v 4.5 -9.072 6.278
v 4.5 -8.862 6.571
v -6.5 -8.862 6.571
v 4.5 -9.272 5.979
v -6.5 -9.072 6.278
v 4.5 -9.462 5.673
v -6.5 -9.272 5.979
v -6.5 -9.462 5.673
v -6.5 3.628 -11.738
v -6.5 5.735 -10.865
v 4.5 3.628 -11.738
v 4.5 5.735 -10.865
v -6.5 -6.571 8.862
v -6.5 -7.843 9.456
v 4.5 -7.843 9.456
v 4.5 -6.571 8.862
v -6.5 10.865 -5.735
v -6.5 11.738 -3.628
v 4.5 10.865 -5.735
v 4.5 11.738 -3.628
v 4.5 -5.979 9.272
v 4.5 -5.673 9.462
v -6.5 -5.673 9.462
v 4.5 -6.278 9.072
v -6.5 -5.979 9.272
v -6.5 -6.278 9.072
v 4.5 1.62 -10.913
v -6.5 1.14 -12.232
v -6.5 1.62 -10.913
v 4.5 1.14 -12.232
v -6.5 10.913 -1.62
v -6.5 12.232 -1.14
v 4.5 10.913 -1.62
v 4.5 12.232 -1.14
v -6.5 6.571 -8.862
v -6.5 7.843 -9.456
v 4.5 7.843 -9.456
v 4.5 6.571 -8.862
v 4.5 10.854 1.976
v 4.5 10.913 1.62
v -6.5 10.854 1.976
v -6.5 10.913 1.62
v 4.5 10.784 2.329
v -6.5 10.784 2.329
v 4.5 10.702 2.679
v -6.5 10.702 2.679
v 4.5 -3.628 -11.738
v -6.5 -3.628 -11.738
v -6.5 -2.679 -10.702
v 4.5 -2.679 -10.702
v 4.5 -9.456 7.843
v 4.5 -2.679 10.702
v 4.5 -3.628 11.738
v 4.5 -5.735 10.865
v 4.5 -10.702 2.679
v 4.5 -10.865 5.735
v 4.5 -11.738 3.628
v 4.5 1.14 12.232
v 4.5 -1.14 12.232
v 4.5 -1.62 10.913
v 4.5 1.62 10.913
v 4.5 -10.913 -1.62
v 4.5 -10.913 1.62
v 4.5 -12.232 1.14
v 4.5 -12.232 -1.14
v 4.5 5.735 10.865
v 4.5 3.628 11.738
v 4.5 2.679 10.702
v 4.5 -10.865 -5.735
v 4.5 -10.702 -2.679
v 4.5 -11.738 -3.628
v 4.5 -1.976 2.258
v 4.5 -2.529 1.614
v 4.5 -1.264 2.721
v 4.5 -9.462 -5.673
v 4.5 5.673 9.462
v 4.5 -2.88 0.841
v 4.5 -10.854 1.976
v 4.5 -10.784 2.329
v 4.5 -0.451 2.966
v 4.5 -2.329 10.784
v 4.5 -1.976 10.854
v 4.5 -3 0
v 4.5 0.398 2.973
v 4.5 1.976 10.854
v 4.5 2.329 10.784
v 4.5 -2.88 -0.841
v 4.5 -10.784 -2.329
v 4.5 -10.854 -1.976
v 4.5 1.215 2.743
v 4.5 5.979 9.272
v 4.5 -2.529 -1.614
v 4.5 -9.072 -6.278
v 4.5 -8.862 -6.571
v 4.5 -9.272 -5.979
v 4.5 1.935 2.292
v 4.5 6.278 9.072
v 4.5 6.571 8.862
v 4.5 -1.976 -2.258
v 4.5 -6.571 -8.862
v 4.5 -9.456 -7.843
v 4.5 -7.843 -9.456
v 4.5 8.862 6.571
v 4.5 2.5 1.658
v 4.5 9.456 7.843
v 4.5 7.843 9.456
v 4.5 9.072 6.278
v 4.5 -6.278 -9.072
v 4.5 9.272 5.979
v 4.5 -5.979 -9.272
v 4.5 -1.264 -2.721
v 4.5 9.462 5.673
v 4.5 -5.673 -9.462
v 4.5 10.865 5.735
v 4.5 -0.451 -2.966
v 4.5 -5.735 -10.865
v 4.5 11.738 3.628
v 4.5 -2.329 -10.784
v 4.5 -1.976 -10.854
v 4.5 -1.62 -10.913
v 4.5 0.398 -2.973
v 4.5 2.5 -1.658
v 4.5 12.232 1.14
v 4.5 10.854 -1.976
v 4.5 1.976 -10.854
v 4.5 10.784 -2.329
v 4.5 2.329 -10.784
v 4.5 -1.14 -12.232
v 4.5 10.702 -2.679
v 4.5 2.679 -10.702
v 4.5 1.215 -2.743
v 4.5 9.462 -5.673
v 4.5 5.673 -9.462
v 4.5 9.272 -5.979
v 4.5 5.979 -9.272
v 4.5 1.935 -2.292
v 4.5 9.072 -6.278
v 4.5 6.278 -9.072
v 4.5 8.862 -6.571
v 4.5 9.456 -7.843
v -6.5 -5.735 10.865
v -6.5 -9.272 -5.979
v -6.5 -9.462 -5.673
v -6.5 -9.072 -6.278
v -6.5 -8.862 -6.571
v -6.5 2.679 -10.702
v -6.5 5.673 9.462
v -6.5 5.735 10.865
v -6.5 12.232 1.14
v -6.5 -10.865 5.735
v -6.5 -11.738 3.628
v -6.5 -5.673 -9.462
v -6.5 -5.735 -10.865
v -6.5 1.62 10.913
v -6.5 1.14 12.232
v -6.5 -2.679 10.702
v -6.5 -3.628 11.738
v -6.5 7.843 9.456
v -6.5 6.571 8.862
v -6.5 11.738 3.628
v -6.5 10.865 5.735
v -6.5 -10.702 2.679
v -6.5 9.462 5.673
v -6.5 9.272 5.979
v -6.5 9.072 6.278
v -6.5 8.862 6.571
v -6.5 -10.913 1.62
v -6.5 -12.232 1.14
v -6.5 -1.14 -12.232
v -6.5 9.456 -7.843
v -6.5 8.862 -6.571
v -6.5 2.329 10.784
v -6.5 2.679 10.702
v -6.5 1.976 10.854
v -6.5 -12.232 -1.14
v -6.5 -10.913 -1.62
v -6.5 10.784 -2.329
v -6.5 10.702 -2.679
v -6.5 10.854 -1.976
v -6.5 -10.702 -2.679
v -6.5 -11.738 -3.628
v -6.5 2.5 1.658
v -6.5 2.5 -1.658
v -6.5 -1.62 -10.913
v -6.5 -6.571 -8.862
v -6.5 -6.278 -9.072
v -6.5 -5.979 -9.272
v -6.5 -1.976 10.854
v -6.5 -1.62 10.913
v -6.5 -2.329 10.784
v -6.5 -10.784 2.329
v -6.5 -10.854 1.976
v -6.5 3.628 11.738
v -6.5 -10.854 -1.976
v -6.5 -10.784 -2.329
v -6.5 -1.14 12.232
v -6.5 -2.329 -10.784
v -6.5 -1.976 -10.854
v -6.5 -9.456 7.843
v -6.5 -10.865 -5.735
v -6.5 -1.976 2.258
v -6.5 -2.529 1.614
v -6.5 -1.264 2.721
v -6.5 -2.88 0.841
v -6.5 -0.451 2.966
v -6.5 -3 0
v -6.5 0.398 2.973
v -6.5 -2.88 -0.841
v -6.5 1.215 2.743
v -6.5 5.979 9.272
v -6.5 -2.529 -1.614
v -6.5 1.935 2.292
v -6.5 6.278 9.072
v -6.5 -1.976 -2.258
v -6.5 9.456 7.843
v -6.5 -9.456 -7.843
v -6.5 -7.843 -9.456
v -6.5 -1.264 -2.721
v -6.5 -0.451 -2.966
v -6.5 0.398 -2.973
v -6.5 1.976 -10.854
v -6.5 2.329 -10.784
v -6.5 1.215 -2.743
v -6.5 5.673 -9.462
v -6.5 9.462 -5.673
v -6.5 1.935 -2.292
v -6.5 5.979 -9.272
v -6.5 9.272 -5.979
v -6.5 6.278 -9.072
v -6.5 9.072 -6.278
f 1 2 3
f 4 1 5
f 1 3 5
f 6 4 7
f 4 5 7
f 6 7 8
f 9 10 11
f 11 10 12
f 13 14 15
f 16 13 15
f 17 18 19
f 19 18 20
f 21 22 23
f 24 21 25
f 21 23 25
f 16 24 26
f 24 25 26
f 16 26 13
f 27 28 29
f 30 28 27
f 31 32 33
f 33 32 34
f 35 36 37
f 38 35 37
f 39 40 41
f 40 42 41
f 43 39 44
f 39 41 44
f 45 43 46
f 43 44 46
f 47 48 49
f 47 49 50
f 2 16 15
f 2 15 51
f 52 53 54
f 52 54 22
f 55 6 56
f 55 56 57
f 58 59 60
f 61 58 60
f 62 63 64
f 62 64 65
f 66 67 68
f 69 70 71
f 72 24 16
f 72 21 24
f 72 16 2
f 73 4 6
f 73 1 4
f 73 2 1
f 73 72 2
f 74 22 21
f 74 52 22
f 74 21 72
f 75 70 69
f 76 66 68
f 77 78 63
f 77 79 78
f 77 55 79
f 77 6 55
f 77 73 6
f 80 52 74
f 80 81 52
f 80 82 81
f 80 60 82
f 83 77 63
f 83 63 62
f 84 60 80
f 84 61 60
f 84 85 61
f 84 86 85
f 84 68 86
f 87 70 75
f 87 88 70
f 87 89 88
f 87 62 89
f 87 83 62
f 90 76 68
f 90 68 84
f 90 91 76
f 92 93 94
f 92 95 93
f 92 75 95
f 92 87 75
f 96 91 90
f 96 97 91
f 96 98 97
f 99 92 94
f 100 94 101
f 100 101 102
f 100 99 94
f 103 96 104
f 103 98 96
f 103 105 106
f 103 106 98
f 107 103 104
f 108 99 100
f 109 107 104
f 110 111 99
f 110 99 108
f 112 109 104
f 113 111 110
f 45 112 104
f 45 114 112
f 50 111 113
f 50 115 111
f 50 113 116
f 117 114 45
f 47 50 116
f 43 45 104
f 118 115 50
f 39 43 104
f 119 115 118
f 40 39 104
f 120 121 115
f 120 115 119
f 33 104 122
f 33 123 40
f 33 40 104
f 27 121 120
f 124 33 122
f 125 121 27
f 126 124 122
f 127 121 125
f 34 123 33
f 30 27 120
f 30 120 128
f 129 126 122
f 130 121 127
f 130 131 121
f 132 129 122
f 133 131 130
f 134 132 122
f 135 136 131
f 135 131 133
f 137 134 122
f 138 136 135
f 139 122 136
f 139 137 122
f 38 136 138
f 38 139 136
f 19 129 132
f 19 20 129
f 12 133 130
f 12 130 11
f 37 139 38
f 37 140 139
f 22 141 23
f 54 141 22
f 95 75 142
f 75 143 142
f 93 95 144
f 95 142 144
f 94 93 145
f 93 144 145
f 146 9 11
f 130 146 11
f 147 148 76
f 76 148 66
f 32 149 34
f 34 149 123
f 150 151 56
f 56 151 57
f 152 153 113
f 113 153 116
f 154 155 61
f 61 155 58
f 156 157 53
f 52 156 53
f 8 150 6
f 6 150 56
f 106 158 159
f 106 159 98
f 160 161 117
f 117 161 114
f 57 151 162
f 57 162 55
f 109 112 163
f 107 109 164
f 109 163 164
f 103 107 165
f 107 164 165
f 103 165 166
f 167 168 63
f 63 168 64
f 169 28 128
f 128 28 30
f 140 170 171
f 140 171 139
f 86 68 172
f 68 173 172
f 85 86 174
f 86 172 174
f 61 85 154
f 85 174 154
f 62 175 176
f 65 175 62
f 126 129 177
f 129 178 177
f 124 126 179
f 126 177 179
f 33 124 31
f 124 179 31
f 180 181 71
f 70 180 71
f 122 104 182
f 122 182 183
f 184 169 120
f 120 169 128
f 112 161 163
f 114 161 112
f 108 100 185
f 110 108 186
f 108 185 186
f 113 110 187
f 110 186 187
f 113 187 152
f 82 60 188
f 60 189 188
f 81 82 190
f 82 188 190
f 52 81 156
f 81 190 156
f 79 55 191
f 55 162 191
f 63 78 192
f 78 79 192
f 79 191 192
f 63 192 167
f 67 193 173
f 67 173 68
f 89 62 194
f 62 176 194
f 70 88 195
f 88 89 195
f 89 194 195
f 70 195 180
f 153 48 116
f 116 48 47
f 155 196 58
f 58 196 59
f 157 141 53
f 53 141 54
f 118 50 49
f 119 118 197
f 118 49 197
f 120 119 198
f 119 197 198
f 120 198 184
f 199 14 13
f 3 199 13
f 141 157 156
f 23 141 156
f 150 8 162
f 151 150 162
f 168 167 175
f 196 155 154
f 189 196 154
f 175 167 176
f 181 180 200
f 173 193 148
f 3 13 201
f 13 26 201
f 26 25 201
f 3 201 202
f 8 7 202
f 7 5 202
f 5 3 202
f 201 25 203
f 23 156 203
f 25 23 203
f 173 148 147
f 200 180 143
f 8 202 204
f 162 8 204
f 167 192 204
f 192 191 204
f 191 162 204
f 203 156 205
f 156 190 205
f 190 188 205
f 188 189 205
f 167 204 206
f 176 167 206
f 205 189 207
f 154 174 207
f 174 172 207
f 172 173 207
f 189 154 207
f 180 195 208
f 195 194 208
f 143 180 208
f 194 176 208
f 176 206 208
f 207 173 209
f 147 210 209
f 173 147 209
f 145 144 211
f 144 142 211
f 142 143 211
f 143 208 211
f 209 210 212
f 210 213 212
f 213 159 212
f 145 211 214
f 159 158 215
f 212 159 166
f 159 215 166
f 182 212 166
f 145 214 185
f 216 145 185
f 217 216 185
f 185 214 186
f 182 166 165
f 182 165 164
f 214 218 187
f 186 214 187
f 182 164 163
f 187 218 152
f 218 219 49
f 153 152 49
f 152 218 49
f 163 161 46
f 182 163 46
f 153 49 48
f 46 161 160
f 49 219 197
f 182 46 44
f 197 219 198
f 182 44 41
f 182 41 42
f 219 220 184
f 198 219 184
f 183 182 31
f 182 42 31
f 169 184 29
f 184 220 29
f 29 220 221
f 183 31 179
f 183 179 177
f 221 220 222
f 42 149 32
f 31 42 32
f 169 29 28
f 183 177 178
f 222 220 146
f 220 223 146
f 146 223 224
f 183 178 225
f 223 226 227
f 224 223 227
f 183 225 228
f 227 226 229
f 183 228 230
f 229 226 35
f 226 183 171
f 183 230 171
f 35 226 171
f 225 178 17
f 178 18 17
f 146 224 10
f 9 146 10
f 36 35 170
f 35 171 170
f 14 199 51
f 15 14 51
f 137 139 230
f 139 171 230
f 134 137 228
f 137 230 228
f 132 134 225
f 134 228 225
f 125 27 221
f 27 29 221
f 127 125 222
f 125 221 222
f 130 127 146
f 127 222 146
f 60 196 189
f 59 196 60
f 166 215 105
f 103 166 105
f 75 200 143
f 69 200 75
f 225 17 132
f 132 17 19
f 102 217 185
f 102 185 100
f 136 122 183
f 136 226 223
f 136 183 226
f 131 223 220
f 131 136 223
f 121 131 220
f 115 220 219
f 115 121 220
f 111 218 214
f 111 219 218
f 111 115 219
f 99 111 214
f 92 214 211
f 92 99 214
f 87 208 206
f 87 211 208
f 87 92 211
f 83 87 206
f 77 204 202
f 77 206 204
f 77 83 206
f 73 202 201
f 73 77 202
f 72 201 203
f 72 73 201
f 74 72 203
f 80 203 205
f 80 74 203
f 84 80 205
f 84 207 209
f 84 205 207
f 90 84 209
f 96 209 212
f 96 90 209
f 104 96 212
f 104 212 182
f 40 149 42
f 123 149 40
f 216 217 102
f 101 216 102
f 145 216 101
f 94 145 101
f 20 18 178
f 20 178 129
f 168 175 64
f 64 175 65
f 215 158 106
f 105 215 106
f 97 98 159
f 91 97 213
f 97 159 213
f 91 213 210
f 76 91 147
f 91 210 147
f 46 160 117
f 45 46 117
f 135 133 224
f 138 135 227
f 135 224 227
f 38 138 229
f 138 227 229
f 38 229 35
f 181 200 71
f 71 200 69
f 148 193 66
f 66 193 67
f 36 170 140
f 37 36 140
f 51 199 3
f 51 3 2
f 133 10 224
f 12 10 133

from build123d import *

# Parameters (mm, degrees)
RIB1_REACH         = 26.171
SKETCH5_WALL_W     = 63.342527862
SKETCH5_WALL_H     = 2.28033022
RIB1_DRAFT_ANGLE   = 20
RIB2_REACH         = 26.171
SKETCH6_WALL_W     = 63.342527862
SKETCH6_WALL_H     = 2.28033022
RIB2_DRAFT_ANGLE   = 20
RIB3_REACH         = 26.171
SKETCH7_WALL_W     = 63.342527862
SKETCH7_WALL_H     = 2.28033022
RIB3_DRAFT_ANGLE   = 20
RIB4_REACH         = 26.171
SKETCH8_WALL_W     = 63.342527862
SKETCH8_WALL_H     = 2.28033022
RIB4_DRAFT_ANGLE   = 20
RIB5_REACH         = 26.171
SKETCH9_WALL_W     = 63.342527862
SKETCH9_WALL_H     = 2.28033022
RIB5_DRAFT_ANGLE   = 20
RIB6_REACH         = 26.171
SKETCH10_WALL_W    = 63.342527862
SKETCH10_WALL_H    = 2.28033022
RIB6_DRAFT_ANGLE   = 20
RIB7_REACH         = 26.171
SKETCH11_WALL_W    = 63.342527862
SKETCH11_WALL_H    = 2.28033022
RIB7_DRAFT_ANGLE   = 20
RIB8_REACH         = 26.171
SKETCH12_WALL_W    = 63.342527862
SKETCH12_WALL_H    = 2.28033022
RIB8_DRAFT_ANGLE   = 20
RIB9_REACH         = 26.171
SKETCH13_WALL_W    = 63.342527862
SKETCH13_WALL_H    = 2.28033022
RIB9_DRAFT_ANGLE   = 20
RIB10_REACH        = 26.171
SKETCH14_WALL_W    = 63.342527862
SKETCH14_WALL_H    = 2.28033022
RIB10_DRAFT_ANGLE  = 20
RIB11_REACH        = 26.171
SKETCH15_WALL_W    = 63.342527862
SKETCH15_WALL_H    = 2.28033022
RIB11_DRAFT_ANGLE  = 20
RIB12_REACH        = 26.171
SKETCH16_WALL_W    = 63.342527862
SKETCH16_WALL_H    = 2.28033022
RIB12_DRAFT_ANGLE  = 20
RIB13_REACH        = 26.171
SKETCH17_WALL_W    = 63.342527862
SKETCH17_WALL_H    = 2.28033022
RIB13_DRAFT_ANGLE  = 20
RIB14_REACH        = 26.171
SKETCH18_WALL_W    = 63.342527862
SKETCH18_WALL_H    = 2.28033022
RIB14_DRAFT_ANGLE  = 20
RIB15_REACH        = 26.171
SKETCH19_WALL_W    = 63.342527862
SKETCH19_WALL_H    = 2.28033022
RIB15_DRAFT_ANGLE  = 20
RIB16_REACH        = 26.171
SKETCH20_WALL_W    = 63.342527862
SKETCH20_WALL_H    = 2.28033022
RIB16_DRAFT_ANGLE  = 20
SKETCH22_R         = 1.5
CUT_EXTRUDE3_DEPTH = 28.712812921
SKETCH21_R         = 20.000403523
CUT_EXTRUDE1_DEPTH = 28.147743921
CUT_EXTRUDE2_START = 13
SKETCH21_2_R       = 20.000403523
CUT_EXTRUDE2_DEPTH = 15.147743921
CUT_EXTRUDE4_DEPTH = 22.639385313
SKETCH24_R         = 18.96161632
CUT_EXTRUDE5_DEPTH = 2


with BuildPart() as part:
    # Sketch1 → Revolve1 (revolve)
    with BuildSketch(Plane.XY, mode=Mode.PRIVATE) as revolve1_sk:
        Polygon((-7.5, 12.3), (-7.5, 0), (7.5, 0), (7.5, 12.3), (8.5, 15.5), (7.5, 16), (6.5, 12.3), (6.5, 11.032395447), (-6.5, 11.032395447), (-6.5, 12.3), (-7.5, 16), (-8.5, 15.5), align=None)
    revolve(revolve1_sk.sketch.rotate(Axis((-8.5, 0, 0), (1, 0, 0)), 270), axis=Axis((-8.5, 0, 0), (1, 0, 0)))

    # Sketch5 wall → Rib1 (add, up to next)
    with BuildSketch(Plane(origin=(0, -12.232395447, 0), x_dir=(1, 0, 0), z_dir=(0, 1, 0)), mode=Mode.PRIVATE) as rib1_sk1:
        Rectangle(SKETCH5_WALL_W, SKETCH5_WALL_H)
    rib1_tool1 = extrude(rib1_sk1.sketch, amount=RIB1_REACH, mode=Mode.PRIVATE) - part.part
    add(rib1_tool1.solids().sort_by_distance((0, -12.232395447, 0))[0])

    # Rib1 draft
    rib1_draft_faces = [part.faces().sort_by_distance(p)[0] for p in [
        (0, -11.732395447, -1.14016511),
        (0, -11.732395447, 1.14016511),
    ]]
    draft(rib1_draft_faces, Plane.XZ.offset(12.232395447), RIB1_DRAFT_ANGLE)

    # Sketch6 wall → Rib2 (add, up to next)
    with BuildSketch(Plane.XY.offset(-12.232395447), mode=Mode.PRIVATE) as rib2_sk1:
        Rectangle(SKETCH6_WALL_W, SKETCH6_WALL_H)
    rib2_tool1 = extrude(rib2_sk1.sketch, amount=RIB2_REACH, mode=Mode.PRIVATE) - part.part
    add(rib2_tool1.solids().sort_by_distance((0, 0, -12.232395447))[0])

    # Rib2 draft
    rib2_draft_faces = [part.faces().sort_by_distance(p)[0] for p in [
        (0, 1.14016511, -11.732395447),
        (0, -1.14016511, -11.732395447),
    ]]
    draft(rib2_draft_faces, Plane(origin=(0, 0, -12.232395447), x_dir=(1, 0, 0), z_dir=(0, 0, -1)), RIB2_DRAFT_ANGLE)

    # Sketch7 wall → Rib3 (add, up to next)
    with BuildSketch(Plane.XZ.offset(-12.232395447), mode=Mode.PRIVATE) as rib3_sk1:
        Rectangle(SKETCH7_WALL_W, SKETCH7_WALL_H)
    rib3_tool1 = extrude(rib3_sk1.sketch, amount=RIB3_REACH, mode=Mode.PRIVATE) - part.part
    add(rib3_tool1.solids().sort_by_distance((0, 12.232395447, 0))[0])

    # Rib3 draft
    rib3_draft_faces = [part.faces().sort_by_distance(p)[0] for p in [
        (0, 11.732395447, 1.14016511),
        (0, 11.732395447, -1.14016511),
    ]]
    draft(rib3_draft_faces, Plane(origin=(0, 12.232395447, 0), x_dir=(1, 0, 0), z_dir=(0, 1, 0)), RIB3_DRAFT_ANGLE)

    # Sketch8 wall → Rib4 (add, up to next)
    with BuildSketch(Plane(origin=(0, 0, 12.232395447), x_dir=(1, 0, 0), z_dir=(0, 0, -1)), mode=Mode.PRIVATE) as rib4_sk1:
        Rectangle(SKETCH8_WALL_W, SKETCH8_WALL_H)
    rib4_tool1 = extrude(rib4_sk1.sketch, amount=RIB4_REACH, mode=Mode.PRIVATE) - part.part
    add(rib4_tool1.solids().sort_by_distance((0, 0, 12.232395447))[0])

    # Rib4 draft
    rib4_draft_faces = [part.faces().sort_by_distance(p)[0] for p in [
        (0, -1.14016511, 11.732395447),
        (0, 1.14016511, 11.732395447),
    ]]
    draft(rib4_draft_faces, Plane.XY.offset(12.232395447), RIB4_DRAFT_ANGLE)

    # Sketch9 wall → Rib5 (add, up to next)
    with BuildSketch(Plane(origin=(0, 8.649609771, 8.649609771), x_dir=(1, 0, 0), z_dir=(0, -0.707106781187, -0.707106781187)), mode=Mode.PRIVATE) as rib5_sk1:
        Rectangle(SKETCH9_WALL_W, SKETCH9_WALL_H)
    rib5_tool1 = extrude(rib5_sk1.sketch, amount=RIB5_REACH, mode=Mode.PRIVATE) - part.part
    add(rib5_tool1.solids().sort_by_distance((0, 8.649609771, 8.649609771))[0])

    # Rib5 draft
    rib5_draft_faces = [part.faces().sort_by_distance(p)[0] for p in [
        (0, 7.4898379, 9.102274861),
        (0, 9.102274861, 7.4898379),
    ]]
    draft(rib5_draft_faces, Plane(origin=(0, 8.649609771, 8.649609771), x_dir=(1, 0, 0), z_dir=(0, 0.707106781187, 0.707106781187)), RIB5_DRAFT_ANGLE)

    # Sketch10 wall → Rib6 (add, up to next)
    with BuildSketch(Plane(origin=(0, 11.301259787, 4.681135076), x_dir=(1, 0, 0), z_dir=(0, -0.923879532511, -0.382683432365)), mode=Mode.PRIVATE) as rib6_sk1:
        Rectangle(SKETCH10_WALL_W, SKETCH10_WALL_H)
    rib6_tool1 = extrude(rib6_sk1.sketch, amount=RIB6_REACH, mode=Mode.PRIVATE) - part.part
    add(rib6_tool1.solids().sort_by_distance((0, 11.301259787, 4.681135076))[0])

    # Rib6 draft
    rib6_draft_faces = [part.faces().sort_by_distance(p)[0] for p in [
        (0, 10.402997723, 5.543168569),
        (0, 11.275642318, 3.436418151),
    ]]
    draft(rib6_draft_faces, Plane(origin=(0, 11.301259787, 4.681135076), x_dir=(1, 0, 0), z_dir=(0, 0.923879532511, 0.382683432365)), RIB6_DRAFT_ANGLE)

    # Sketch11 wall → Rib7 (add, up to next)
    with BuildSketch(Plane(origin=(0, 4.681135076, -11.301259787), x_dir=(1, 0, 0), z_dir=(0, -0.382683432365, 0.923879532511)), mode=Mode.PRIVATE) as rib7_sk1:
        Rectangle(SKETCH11_WALL_W, SKETCH11_WALL_H)
    rib7_tool1 = extrude(rib7_sk1.sketch, amount=RIB7_REACH, mode=Mode.PRIVATE) - part.part
    add(rib7_tool1.solids().sort_by_distance((0, 4.681135076, -11.301259787))[0])

    # Rib7 draft
    rib7_draft_faces = [part.faces().sort_by_distance(p)[0] for p in [
        (0, 5.543168569, -10.402997723),
        (0, 3.436418151, -11.275642318),
    ]]
    draft(rib7_draft_faces, Plane(origin=(0, 4.681135076, -11.301259787), x_dir=(1, 0, 0), z_dir=(0, 0.382683432365, -0.923879532511)), RIB7_DRAFT_ANGLE)

    # Sketch12 wall → Rib8 (add, up to next)
    with BuildSketch(Plane(origin=(0, 4.681135076, 11.301259787), x_dir=(1, 0, 0), z_dir=(0, -0.382683432365, -0.923879532511)), mode=Mode.PRIVATE) as rib8_sk1:
        Rectangle(SKETCH12_WALL_W, SKETCH12_WALL_H)
    rib8_tool1 = extrude(rib8_sk1.sketch, amount=RIB8_REACH, mode=Mode.PRIVATE) - part.part
    add(rib8_tool1.solids().sort_by_distance((0, 4.681135076, 11.301259787))[0])

    # Rib8 draft
    rib8_draft_faces = [part.faces().sort_by_distance(p)[0] for p in [
        (0, 3.436418151, 11.275642318),
        (0, 5.543168569, 10.402997723),
    ]]
    draft(rib8_draft_faces, Plane(origin=(0, 4.681135076, 11.301259787), x_dir=(1, 0, 0), z_dir=(0, 0.382683432365, 0.923879532511)), RIB8_DRAFT_ANGLE)

    # Sketch13 wall → Rib9 (add, up to next)
    with BuildSketch(Plane(origin=(0, -8.649609771, 8.649609771), x_dir=(1, 0, 0), z_dir=(0, 0.707106781187, -0.707106781187)), mode=Mode.PRIVATE) as rib9_sk1:
        Rectangle(SKETCH13_WALL_W, SKETCH13_WALL_H)
    rib9_tool1 = extrude(rib9_sk1.sketch, amount=RIB9_REACH, mode=Mode.PRIVATE) - part.part
    add(rib9_tool1.solids().sort_by_distance((0, -8.649609771, 8.649609771))[0])

    # Rib9 draft
    rib9_draft_faces = [part.faces().sort_by_distance(p)[0] for p in [
        (0, -9.102274861, 7.4898379),
        (0, -7.4898379, 9.102274861),
    ]]
    draft(rib9_draft_faces, Plane(origin=(0, -8.649609771, 8.649609771), x_dir=(1, 0, 0), z_dir=(0, -0.707106781187, 0.707106781187)), RIB9_DRAFT_ANGLE)

    # Sketch14 wall → Rib10 (add, up to next)
    with BuildSketch(Plane(origin=(0, 8.649609771, -8.649609771), x_dir=(1, 0, 0), z_dir=(0, -0.707106781187, 0.707106781187)), mode=Mode.PRIVATE) as rib10_sk1:
        Rectangle(SKETCH14_WALL_W, SKETCH14_WALL_H)
    rib10_tool1 = extrude(rib10_sk1.sketch, amount=RIB10_REACH, mode=Mode.PRIVATE) - part.part
    add(rib10_tool1.solids().sort_by_distance((0, 8.649609771, -8.649609771))[0])

    # Rib10 draft
    rib10_draft_faces = [part.faces().sort_by_distance(p)[0] for p in [
        (0, 9.102274861, -7.4898379),
        (0, 7.4898379, -9.102274861),
    ]]
    draft(rib10_draft_faces, Plane(origin=(0, 8.649609771, -8.649609771), x_dir=(1, 0, 0), z_dir=(0, 0.707106781187, -0.707106781187)), RIB10_DRAFT_ANGLE)

    # Sketch15 wall → Rib11 (add, up to next)
    with BuildSketch(Plane(origin=(0, -8.649609771, -8.649609771), x_dir=(1, 0, 0), z_dir=(0, 0.707106781187, 0.707106781187)), mode=Mode.PRIVATE) as rib11_sk1:
        Rectangle(SKETCH15_WALL_W, SKETCH15_WALL_H)
    rib11_tool1 = extrude(rib11_sk1.sketch, amount=RIB11_REACH, mode=Mode.PRIVATE) - part.part
    add(rib11_tool1.solids().sort_by_distance((0, -8.649609771, -8.649609771))[0])

    # Rib11 draft
    rib11_draft_faces = [part.faces().sort_by_distance(p)[0] for p in [
        (0, -7.4898379, -9.102274861),
        (0, -9.102274861, -7.4898379),
    ]]
    draft(rib11_draft_faces, Plane(origin=(0, -8.649609771, -8.649609771), x_dir=(1, 0, 0), z_dir=(0, -0.707106781187, -0.707106781187)), RIB11_DRAFT_ANGLE)

    # Sketch16 wall → Rib12 (add, up to next)
    with BuildSketch(Plane(origin=(0, 11.301259787, -4.681135076), x_dir=(1, 0, 0), z_dir=(0, -0.923879532511, 0.382683432365)), mode=Mode.PRIVATE) as rib12_sk1:
        Rectangle(SKETCH16_WALL_W, SKETCH16_WALL_H)
    rib12_tool1 = extrude(rib12_sk1.sketch, amount=RIB12_REACH, mode=Mode.PRIVATE) - part.part
    add(rib12_tool1.solids().sort_by_distance((0, 11.301259787, -4.681135076))[0])

    # Rib12 draft
    rib12_draft_faces = [part.faces().sort_by_distance(p)[0] for p in [
        (0, 11.275642318, -3.436418151),
        (0, 10.402997723, -5.543168569),
    ]]
    draft(rib12_draft_faces, Plane(origin=(0, 11.301259787, -4.681135076), x_dir=(1, 0, 0), z_dir=(0, 0.923879532511, -0.382683432365)), RIB12_DRAFT_ANGLE)

    # Sketch17 wall → Rib13 (add, up to next)
    with BuildSketch(Plane(origin=(0, -11.301259787, -4.681135076), x_dir=(1, 0, 0), z_dir=(0, 0.923879532511, 0.382683432365)), mode=Mode.PRIVATE) as rib13_sk1:
        Rectangle(SKETCH17_WALL_W, SKETCH17_WALL_H)
    rib13_tool1 = extrude(rib13_sk1.sketch, amount=RIB13_REACH, mode=Mode.PRIVATE) - part.part
    add(rib13_tool1.solids().sort_by_distance((0, -11.301259787, -4.681135076))[0])

    # Rib13 draft
    rib13_draft_faces = [part.faces().sort_by_distance(p)[0] for p in [
        (0, -10.402997723, -5.543168569),
        (0, -11.275642318, -3.436418151),
    ]]
    draft(rib13_draft_faces, Plane(origin=(0, -11.301259787, -4.681135076), x_dir=(1, 0, 0), z_dir=(0, -0.923879532511, -0.382683432365)), RIB13_DRAFT_ANGLE)

    # Sketch18 wall → Rib14 (add, up to next)
    with BuildSketch(Plane(origin=(0, -4.681135076, 11.301259787), x_dir=(1, 0, 0), z_dir=(0, 0.382683432365, -0.923879532511)), mode=Mode.PRIVATE) as rib14_sk1:
        Rectangle(SKETCH18_WALL_W, SKETCH18_WALL_H)
    rib14_tool1 = extrude(rib14_sk1.sketch, amount=RIB14_REACH, mode=Mode.PRIVATE) - part.part
    add(rib14_tool1.solids().sort_by_distance((0, -4.681135076, 11.301259787))[0])

    # Rib14 draft
    rib14_draft_faces = [part.faces().sort_by_distance(p)[0] for p in [
        (0, -5.543168569, 10.402997723),
        (0, -3.436418151, 11.275642318),
    ]]
    draft(rib14_draft_faces, Plane(origin=(0, -4.681135076, 11.301259787), x_dir=(1, 0, 0), z_dir=(0, -0.382683432365, 0.923879532511)), RIB14_DRAFT_ANGLE)

    # Sketch19 wall → Rib15 (add, up to next)
    with BuildSketch(Plane(origin=(0, -4.681135076, -11.301259787), x_dir=(1, 0, 0), z_dir=(0, 0.382683432365, 0.923879532511)), mode=Mode.PRIVATE) as rib15_sk1:
        Rectangle(SKETCH19_WALL_W, SKETCH19_WALL_H)
    rib15_tool1 = extrude(rib15_sk1.sketch, amount=RIB15_REACH, mode=Mode.PRIVATE) - part.part
    add(rib15_tool1.solids().sort_by_distance((0, -4.681135076, -11.301259787))[0])

    # Rib15 draft
    rib15_draft_faces = [part.faces().sort_by_distance(p)[0] for p in [
        (0, -3.436418151, -11.275642318),
        (0, -5.543168569, -10.402997723),
    ]]
    draft(rib15_draft_faces, Plane(origin=(0, -4.681135076, -11.301259787), x_dir=(1, 0, 0), z_dir=(0, -0.382683432365, -0.923879532511)), RIB15_DRAFT_ANGLE)

    # Sketch20 wall → Rib16 (add, up to next)
    with BuildSketch(Plane(origin=(0, -11.301259787, 4.681135076), x_dir=(1, 0, 0), z_dir=(0, 0.923879532511, -0.382683432365)), mode=Mode.PRIVATE) as rib16_sk1:
        Rectangle(SKETCH20_WALL_W, SKETCH20_WALL_H)
    rib16_tool1 = extrude(rib16_sk1.sketch, amount=RIB16_REACH, mode=Mode.PRIVATE) - part.part
    add(rib16_tool1.solids().sort_by_distance((0, -11.301259787, 4.681135076))[0])

    # Rib16 draft
    rib16_draft_faces = [part.faces().sort_by_distance(p)[0] for p in [
        (0, -11.275642318, 3.436418151),
        (0, -10.402997723, 5.543168569),
    ]]
    draft(rib16_draft_faces, Plane(origin=(0, -11.301259787, 4.681135076), x_dir=(1, 0, 0), z_dir=(0, -0.923879532511, 0.382683432365)), RIB16_DRAFT_ANGLE)

    # Sketch22 → Cut-Extrude3 (cut, through all)
    with BuildSketch(Plane(origin=(7.5, 0, 0), x_dir=(0, 0, -1), z_dir=(1, 0, 0))):
        Circle(SKETCH22_R)
    extrude(amount=-CUT_EXTRUDE3_DEPTH, mode=Mode.SUBTRACT)

    # Sketch21 → Cut-Extrude1 (cut, through all)
    with BuildSketch(Plane(origin=(-6.5, 0, 0), x_dir=(0, 0, -1), z_dir=(1, 0, 0))):
        Circle(SKETCH21_R)
    extrude(amount=-CUT_EXTRUDE1_DEPTH, mode=Mode.SUBTRACT)

    # Sketch21<2> → Cut-Extrude2 (cut, through all)
    with BuildSketch(Plane(origin=(-6.5, 0, 0), x_dir=(0, 0, -1), z_dir=(1, 0, 0)).offset(CUT_EXTRUDE2_START)):
        Circle(SKETCH21_2_R)
    extrude(amount=CUT_EXTRUDE2_DEPTH, mode=Mode.SUBTRACT)

    # Sketch23 → Cut-Extrude4 (cut, through all)
    with BuildSketch(Plane(origin=(6.5, 0, 0), x_dir=(0, 0, -1), z_dir=(1, 0, 0))):
        with BuildLine():
            Line((-1.658312395, 2.5), (1.658312395, 2.5))
            ThreePointArc((1.658312395, 2.5), (0, -3), (-1.658312395, 2.5))
        make_face()
    extrude(amount=-CUT_EXTRUDE4_DEPTH, mode=Mode.SUBTRACT)

    # Sketch24 → Cut-Extrude5 (cut)
    with BuildSketch(Plane(origin=(6.5, 0, 0), x_dir=(0, 0, -1), z_dir=(1, 0, 0))):
        Circle(SKETCH24_R)
    extrude(amount=-CUT_EXTRUDE5_DEPTH, mode=Mode.SUBTRACT)


solid = part.part
